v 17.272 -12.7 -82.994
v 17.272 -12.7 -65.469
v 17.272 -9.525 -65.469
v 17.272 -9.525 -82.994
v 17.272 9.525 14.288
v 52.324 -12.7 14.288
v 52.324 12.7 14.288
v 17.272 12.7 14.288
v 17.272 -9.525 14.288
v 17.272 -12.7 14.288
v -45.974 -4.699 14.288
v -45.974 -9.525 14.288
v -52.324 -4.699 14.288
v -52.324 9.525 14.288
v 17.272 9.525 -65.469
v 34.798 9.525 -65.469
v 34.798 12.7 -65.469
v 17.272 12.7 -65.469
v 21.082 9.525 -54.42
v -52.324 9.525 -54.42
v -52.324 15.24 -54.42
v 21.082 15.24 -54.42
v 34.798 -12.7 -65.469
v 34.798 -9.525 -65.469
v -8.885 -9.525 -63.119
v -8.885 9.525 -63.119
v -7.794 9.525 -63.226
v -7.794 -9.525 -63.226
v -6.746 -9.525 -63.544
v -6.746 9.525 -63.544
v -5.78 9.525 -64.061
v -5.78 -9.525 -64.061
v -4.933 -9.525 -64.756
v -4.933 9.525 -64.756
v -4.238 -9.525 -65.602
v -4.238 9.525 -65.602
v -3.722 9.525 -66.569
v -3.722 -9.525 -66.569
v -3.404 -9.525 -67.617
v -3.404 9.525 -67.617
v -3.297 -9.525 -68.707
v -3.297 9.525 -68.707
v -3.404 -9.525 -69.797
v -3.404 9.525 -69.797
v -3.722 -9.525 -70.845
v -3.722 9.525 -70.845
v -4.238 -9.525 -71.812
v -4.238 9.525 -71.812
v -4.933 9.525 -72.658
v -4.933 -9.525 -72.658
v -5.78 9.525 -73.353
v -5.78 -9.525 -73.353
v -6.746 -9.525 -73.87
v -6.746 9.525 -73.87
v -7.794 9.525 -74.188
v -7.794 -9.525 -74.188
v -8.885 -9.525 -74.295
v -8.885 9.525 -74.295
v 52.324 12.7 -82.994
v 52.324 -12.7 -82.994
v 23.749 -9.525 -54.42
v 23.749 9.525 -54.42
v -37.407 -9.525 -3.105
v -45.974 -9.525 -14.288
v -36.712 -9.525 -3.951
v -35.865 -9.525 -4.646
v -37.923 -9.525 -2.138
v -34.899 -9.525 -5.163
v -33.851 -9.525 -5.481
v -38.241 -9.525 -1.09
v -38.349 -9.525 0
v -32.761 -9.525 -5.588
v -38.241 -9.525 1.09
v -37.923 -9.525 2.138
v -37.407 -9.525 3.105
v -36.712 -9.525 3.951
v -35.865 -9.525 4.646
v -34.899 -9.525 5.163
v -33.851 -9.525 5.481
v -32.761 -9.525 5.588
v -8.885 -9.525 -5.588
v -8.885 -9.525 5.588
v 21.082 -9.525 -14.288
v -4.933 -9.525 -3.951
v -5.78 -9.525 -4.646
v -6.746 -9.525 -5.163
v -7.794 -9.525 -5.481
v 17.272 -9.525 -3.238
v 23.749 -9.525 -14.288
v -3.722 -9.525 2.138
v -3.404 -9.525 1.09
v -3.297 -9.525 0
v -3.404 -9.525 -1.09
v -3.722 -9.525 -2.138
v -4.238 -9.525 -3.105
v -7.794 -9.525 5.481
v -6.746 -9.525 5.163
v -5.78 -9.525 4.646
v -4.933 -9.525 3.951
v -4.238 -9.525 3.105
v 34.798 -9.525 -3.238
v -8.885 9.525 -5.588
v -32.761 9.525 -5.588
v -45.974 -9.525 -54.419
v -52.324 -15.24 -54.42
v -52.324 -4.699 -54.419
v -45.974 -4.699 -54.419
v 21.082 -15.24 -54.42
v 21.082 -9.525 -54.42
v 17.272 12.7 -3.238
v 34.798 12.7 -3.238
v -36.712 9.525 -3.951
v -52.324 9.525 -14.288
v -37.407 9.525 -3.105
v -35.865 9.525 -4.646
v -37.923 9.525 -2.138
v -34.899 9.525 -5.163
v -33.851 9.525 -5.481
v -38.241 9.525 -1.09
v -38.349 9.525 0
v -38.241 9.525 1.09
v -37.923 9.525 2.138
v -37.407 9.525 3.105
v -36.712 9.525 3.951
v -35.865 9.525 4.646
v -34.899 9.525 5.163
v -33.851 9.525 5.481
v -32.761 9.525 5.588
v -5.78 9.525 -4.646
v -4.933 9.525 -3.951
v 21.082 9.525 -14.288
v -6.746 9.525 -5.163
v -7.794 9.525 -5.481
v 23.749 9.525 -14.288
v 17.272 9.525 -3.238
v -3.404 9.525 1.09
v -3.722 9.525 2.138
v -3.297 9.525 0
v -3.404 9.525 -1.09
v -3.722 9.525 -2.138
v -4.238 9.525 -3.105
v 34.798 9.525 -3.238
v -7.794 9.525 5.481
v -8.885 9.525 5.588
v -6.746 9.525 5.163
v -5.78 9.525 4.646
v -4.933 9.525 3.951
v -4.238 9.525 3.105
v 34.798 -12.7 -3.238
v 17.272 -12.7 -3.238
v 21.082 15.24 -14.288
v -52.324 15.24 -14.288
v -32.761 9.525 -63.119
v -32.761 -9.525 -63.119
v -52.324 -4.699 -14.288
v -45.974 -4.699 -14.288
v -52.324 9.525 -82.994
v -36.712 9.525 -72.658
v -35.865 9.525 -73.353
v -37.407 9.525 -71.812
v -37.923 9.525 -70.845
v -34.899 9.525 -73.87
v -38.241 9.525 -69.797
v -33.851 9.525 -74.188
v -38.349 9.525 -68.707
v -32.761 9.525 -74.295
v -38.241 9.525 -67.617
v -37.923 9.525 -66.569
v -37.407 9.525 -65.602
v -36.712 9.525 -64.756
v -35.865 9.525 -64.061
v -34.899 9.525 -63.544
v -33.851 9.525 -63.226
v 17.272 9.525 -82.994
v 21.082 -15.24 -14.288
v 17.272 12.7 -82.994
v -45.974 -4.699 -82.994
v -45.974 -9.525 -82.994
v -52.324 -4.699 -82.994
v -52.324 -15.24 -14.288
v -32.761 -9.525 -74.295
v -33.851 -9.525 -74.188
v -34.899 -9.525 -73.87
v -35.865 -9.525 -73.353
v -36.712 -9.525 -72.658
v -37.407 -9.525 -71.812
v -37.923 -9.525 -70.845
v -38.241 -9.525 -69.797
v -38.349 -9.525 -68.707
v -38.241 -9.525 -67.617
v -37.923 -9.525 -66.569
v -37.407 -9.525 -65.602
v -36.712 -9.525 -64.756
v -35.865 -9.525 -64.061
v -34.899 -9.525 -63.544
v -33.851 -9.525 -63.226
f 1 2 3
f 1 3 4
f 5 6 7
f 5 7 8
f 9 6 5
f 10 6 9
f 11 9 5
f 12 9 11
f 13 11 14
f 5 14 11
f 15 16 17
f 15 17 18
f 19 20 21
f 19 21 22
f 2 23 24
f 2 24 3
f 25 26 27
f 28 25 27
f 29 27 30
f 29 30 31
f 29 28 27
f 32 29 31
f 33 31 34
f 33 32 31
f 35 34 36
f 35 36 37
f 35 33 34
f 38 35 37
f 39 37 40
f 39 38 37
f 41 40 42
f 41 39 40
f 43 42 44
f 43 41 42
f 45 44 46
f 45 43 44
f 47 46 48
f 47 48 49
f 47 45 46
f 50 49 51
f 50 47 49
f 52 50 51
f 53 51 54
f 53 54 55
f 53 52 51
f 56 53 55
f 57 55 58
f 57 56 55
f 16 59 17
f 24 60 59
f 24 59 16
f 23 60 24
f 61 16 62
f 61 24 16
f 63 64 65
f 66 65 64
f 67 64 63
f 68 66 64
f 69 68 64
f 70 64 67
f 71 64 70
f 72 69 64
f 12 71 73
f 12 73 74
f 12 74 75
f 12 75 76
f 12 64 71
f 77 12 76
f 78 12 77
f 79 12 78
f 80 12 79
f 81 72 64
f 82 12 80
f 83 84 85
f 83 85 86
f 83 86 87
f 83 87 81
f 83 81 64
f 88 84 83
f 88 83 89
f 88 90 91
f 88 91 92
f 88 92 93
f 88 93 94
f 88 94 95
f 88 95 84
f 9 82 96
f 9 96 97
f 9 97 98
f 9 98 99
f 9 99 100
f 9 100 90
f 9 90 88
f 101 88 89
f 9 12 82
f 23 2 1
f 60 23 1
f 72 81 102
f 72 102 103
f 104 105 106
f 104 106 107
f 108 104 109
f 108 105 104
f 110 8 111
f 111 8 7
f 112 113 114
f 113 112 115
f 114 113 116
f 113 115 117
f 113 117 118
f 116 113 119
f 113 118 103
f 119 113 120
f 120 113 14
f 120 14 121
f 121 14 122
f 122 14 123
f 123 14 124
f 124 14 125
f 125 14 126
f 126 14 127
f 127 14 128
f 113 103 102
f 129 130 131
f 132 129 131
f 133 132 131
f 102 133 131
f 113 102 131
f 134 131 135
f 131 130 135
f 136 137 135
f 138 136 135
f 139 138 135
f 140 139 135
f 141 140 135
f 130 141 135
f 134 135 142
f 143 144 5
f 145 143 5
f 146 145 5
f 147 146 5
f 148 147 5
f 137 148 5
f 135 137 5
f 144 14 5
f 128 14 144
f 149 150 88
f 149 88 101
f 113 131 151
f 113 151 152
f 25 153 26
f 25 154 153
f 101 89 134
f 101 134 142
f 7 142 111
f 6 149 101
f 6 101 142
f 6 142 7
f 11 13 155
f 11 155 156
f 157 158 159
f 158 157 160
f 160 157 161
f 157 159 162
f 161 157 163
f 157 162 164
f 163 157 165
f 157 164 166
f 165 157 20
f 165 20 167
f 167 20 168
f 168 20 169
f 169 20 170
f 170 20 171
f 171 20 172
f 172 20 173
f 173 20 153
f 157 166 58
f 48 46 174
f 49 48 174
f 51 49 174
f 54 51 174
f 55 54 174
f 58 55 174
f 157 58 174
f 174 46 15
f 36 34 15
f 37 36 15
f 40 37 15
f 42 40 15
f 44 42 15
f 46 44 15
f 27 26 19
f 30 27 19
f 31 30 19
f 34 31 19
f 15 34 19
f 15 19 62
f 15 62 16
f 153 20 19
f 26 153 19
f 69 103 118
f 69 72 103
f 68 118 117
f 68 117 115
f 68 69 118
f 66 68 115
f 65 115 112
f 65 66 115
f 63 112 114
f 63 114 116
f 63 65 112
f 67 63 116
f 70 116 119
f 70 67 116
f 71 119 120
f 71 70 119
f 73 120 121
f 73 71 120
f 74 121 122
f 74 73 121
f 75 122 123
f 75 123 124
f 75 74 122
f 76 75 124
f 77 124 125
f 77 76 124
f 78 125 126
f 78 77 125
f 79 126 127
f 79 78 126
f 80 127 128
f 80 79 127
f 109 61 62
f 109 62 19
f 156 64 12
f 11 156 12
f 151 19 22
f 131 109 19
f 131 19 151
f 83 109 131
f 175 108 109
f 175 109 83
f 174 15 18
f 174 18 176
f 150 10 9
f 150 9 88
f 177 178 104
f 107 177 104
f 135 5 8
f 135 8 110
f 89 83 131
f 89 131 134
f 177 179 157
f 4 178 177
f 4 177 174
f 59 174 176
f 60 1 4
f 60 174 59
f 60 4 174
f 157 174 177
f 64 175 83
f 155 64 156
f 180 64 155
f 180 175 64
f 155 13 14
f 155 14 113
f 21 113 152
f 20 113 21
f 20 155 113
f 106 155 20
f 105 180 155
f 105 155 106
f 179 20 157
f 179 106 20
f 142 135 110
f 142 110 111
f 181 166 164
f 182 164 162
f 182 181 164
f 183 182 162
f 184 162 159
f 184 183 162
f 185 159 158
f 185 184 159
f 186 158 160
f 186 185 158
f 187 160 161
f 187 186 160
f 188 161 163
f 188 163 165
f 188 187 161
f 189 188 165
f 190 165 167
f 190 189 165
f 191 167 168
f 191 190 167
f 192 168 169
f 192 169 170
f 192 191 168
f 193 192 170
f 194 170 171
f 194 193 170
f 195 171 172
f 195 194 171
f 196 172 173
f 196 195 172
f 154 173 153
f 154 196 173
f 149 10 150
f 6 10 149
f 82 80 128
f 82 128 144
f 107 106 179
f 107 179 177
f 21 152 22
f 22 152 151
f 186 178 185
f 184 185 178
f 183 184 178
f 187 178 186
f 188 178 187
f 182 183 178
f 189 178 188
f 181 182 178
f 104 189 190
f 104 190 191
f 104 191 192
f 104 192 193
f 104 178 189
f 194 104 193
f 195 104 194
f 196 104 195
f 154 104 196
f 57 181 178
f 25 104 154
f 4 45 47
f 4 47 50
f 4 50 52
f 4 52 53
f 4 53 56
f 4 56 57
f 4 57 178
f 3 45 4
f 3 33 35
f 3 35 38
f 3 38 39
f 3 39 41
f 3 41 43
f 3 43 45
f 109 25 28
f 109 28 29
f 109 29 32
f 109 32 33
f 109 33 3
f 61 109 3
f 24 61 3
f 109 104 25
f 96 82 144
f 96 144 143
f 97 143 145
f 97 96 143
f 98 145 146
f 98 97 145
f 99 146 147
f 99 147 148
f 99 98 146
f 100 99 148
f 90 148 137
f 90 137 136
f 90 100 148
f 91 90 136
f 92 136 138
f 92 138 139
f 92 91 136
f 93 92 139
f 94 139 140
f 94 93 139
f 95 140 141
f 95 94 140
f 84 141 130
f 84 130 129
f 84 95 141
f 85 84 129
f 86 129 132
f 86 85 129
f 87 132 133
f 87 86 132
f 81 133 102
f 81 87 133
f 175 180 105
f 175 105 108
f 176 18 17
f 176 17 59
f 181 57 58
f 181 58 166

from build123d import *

# Parameters (mm, degrees)
F0_W      = 6.35
F0_H      = 28.575
F1_DEPTH  = 9.525
F2_DEPTH  = 12.7
F3_DEPTH  = 15.24
F4_DEPTH  = 12.7
F5_W      = 6.35
F5_H      = 28.575
F6_DEPTH  = 4.826
F7_DEPTH  = 12.7
F8_DEPTH  = 15.24
F9_DEPTH  = 12.7
F10_W     = 6.35
F10_H     = 28.575
F11_DEPTH = 4.826


with BuildPart() as f1:
    # F0 (on Front) → F1 (new body, symmetric)
    with BuildSketch(Plane.XZ):
        with Locations((-49.149, 0)):
            Rectangle(F0_W, F0_H)
        Polygon((17.272, 14.2875), (-45.974, 14.2875), (-45.974, -14.2875), (21.082, -14.2875), (23.749, -14.2875), (34.798, -3.2385), (17.272, -3.2385), align=None)
        with BuildLine():
            Line((-32.760566, 5.588), (-8.884566, 5.588))
            ThreePointArc((-8.884566, 5.588), (-3.296566, 0), (-8.884566, -5.588))
            Line((-8.884566, -5.588), (-32.760566, -5.588))
            ThreePointArc((-32.760566, -5.588), (-38.348566, 0), (-32.760566, 5.588))
        make_face(mode=Mode.SUBTRACT)
        Polygon((-45.974, -14.2875), (-52.324, -14.2875), (-52.324, -34.3535), (21.082, -34.3535), (21.082, -14.2875), align=None)
        Polygon((52.324, 14.2875), (17.272, 14.2875), (17.272, -3.2385), (34.798, -3.2385), align=None)
        Polygon((21.082, -34.3535), (-52.324, -34.3535), (-52.324, -54.4195), (-45.974, -54.4195), (21.082, -54.4195), align=None)
        Polygon((52.324, -14.2875), (52.324, 14.2875), (34.798, -3.2385), (23.749, -14.2875), align=None)
        with Locations((-49.149, -68.707)):
            Rectangle(F0_W, F0_H)
        Polygon((23.749, -54.4195), (21.082, -54.4195), (-45.974, -54.4195), (-45.974, -82.9945), (17.272, -82.9945), (17.272, -65.4685), (34.798, -65.4685), align=None)
        with BuildLine():
            ThreePointArc((-8.884566, -63.119), (-3.296566, -68.707), (-8.884566, -74.295))
            Line((-8.884566, -74.295), (-32.760566, -74.295))
            ThreePointArc((-32.760566, -74.295), (-38.348566, -68.707), (-32.760566, -63.119))
            Line((-32.760566, -63.119), (-8.884566, -63.119))
        make_face(mode=Mode.SUBTRACT)
        Polygon((52.324, -54.4195), (23.749, -54.4195), (34.798, -65.4685), (52.324, -82.9945), align=None)
        Polygon((52.324, -82.9945), (34.798, -65.4685), (17.272, -65.4685), (17.272, -82.9945), align=None)
    extrude(amount=F1_DEPTH, both=True)

    # F0 (on Front) → F2 (cut, symmetric)
    with BuildSketch(Plane.XZ):
        Polygon((52.324, -14.2875), (52.324, 14.2875), (34.798, -3.2385), (23.749, -14.2875), align=None)
    extrude(amount=F2_DEPTH, both=True, mode=Mode.SUBTRACT)

    # F0 (on Front) → F3 (join, symmetric)
    with BuildSketch(Plane.XZ):
        Polygon((-45.974, -14.2875), (-52.324, -14.2875), (-52.324, -34.3535), (21.082, -34.3535), (21.082, -14.2875), align=None)
    extrude(amount=F3_DEPTH, both=True)

    # F0 (on Front) → F4 (join, symmetric)
    with BuildSketch(Plane.XZ):
        Polygon((52.324, 14.2875), (17.272, 14.2875), (17.272, -3.2385), (34.798, -3.2385), align=None)
    extrude(amount=F4_DEPTH, both=True)

    # F5 (on face) → F6 (cut)
    with BuildSketch(Plane.XZ.offset(9.525)):
        with Locations((-49.149, 0)):
            Rectangle(F5_W, F5_H)
    extrude(amount=-F6_DEPTH, mode=Mode.SUBTRACT)

    # F0 (on Front) → F7 (cut, symmetric)
    with BuildSketch(Plane.XZ):
        Polygon((52.324, -54.4195), (23.749, -54.4195), (34.798, -65.4685), (52.324, -82.9945), align=None)
    extrude(amount=F7_DEPTH, both=True, mode=Mode.SUBTRACT)

    # F0 (on Front) → F8 (join, symmetric)
    with BuildSketch(Plane.XZ):
        Polygon((21.082, -34.3535), (-52.324, -34.3535), (-52.324, -54.4195), (-45.974, -54.4195), (21.082, -54.4195), align=None)
    extrude(amount=F8_DEPTH, both=True)

    # F0 (on Front) → F9 (join, symmetric)
    with BuildSketch(Plane.XZ):
        Polygon((52.324, -82.9945), (34.798, -65.4685), (17.272, -65.4685), (17.272, -82.9945), align=None)
    extrude(amount=F9_DEPTH, both=True)

    # F10 (on face) → F11 (cut)
    with BuildSketch(Plane.XZ.offset(9.525)):
        with Locations((-49.149, -68.707)):
            Rectangle(F10_W, F10_H)
    extrude(amount=-F11_DEPTH, mode=Mode.SUBTRACT)


solid = f1.part
